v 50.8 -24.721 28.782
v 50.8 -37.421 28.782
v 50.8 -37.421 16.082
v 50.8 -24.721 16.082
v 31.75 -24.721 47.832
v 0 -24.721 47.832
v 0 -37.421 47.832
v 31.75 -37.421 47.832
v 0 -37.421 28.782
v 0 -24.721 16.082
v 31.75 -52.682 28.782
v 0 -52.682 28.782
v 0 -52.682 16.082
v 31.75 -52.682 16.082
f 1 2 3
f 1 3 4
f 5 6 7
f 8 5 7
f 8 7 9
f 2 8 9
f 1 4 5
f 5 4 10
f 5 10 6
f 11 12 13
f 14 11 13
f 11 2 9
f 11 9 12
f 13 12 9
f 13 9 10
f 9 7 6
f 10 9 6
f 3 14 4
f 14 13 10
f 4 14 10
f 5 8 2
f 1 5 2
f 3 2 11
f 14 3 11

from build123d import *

# Parameters (mm, degrees)
F1_DEPTH = 50.8
F3_DEPTH = 12.701
F5_DEPTH = 12.701


with BuildPart() as f1:
    # F0 (on Right) → F1 (new body)
    with BuildSketch(Plane.YZ):
        Polygon((-24.720795, 16.082145), (-24.720795, 47.832145), (-37.420795, 47.832145), (-37.420795, 28.782145), (-52.681845, 28.782145), (-52.681845, 16.082145), align=None)
    extrude(amount=F1_DEPTH)

    # F2 (on face) → F3 (cut, through all)
    with BuildSketch(Plane.XZ.offset(37.420795)):
        Polygon((31.75, 47.832145), (50.8, 28.782145), (50.8, 47.832145), align=None)
    extrude(amount=-F3_DEPTH, mode=Mode.SUBTRACT)

    # F4 (on face) → F5 (cut, through all)
    with BuildSketch(Plane.XY.offset(28.782145)):
        Polygon((50.8, -52.681845), (50.8, -37.420795), (31.75, -52.681845), align=None)
    extrude(amount=-F5_DEPTH, mode=Mode.SUBTRACT)


solid = f1.part
